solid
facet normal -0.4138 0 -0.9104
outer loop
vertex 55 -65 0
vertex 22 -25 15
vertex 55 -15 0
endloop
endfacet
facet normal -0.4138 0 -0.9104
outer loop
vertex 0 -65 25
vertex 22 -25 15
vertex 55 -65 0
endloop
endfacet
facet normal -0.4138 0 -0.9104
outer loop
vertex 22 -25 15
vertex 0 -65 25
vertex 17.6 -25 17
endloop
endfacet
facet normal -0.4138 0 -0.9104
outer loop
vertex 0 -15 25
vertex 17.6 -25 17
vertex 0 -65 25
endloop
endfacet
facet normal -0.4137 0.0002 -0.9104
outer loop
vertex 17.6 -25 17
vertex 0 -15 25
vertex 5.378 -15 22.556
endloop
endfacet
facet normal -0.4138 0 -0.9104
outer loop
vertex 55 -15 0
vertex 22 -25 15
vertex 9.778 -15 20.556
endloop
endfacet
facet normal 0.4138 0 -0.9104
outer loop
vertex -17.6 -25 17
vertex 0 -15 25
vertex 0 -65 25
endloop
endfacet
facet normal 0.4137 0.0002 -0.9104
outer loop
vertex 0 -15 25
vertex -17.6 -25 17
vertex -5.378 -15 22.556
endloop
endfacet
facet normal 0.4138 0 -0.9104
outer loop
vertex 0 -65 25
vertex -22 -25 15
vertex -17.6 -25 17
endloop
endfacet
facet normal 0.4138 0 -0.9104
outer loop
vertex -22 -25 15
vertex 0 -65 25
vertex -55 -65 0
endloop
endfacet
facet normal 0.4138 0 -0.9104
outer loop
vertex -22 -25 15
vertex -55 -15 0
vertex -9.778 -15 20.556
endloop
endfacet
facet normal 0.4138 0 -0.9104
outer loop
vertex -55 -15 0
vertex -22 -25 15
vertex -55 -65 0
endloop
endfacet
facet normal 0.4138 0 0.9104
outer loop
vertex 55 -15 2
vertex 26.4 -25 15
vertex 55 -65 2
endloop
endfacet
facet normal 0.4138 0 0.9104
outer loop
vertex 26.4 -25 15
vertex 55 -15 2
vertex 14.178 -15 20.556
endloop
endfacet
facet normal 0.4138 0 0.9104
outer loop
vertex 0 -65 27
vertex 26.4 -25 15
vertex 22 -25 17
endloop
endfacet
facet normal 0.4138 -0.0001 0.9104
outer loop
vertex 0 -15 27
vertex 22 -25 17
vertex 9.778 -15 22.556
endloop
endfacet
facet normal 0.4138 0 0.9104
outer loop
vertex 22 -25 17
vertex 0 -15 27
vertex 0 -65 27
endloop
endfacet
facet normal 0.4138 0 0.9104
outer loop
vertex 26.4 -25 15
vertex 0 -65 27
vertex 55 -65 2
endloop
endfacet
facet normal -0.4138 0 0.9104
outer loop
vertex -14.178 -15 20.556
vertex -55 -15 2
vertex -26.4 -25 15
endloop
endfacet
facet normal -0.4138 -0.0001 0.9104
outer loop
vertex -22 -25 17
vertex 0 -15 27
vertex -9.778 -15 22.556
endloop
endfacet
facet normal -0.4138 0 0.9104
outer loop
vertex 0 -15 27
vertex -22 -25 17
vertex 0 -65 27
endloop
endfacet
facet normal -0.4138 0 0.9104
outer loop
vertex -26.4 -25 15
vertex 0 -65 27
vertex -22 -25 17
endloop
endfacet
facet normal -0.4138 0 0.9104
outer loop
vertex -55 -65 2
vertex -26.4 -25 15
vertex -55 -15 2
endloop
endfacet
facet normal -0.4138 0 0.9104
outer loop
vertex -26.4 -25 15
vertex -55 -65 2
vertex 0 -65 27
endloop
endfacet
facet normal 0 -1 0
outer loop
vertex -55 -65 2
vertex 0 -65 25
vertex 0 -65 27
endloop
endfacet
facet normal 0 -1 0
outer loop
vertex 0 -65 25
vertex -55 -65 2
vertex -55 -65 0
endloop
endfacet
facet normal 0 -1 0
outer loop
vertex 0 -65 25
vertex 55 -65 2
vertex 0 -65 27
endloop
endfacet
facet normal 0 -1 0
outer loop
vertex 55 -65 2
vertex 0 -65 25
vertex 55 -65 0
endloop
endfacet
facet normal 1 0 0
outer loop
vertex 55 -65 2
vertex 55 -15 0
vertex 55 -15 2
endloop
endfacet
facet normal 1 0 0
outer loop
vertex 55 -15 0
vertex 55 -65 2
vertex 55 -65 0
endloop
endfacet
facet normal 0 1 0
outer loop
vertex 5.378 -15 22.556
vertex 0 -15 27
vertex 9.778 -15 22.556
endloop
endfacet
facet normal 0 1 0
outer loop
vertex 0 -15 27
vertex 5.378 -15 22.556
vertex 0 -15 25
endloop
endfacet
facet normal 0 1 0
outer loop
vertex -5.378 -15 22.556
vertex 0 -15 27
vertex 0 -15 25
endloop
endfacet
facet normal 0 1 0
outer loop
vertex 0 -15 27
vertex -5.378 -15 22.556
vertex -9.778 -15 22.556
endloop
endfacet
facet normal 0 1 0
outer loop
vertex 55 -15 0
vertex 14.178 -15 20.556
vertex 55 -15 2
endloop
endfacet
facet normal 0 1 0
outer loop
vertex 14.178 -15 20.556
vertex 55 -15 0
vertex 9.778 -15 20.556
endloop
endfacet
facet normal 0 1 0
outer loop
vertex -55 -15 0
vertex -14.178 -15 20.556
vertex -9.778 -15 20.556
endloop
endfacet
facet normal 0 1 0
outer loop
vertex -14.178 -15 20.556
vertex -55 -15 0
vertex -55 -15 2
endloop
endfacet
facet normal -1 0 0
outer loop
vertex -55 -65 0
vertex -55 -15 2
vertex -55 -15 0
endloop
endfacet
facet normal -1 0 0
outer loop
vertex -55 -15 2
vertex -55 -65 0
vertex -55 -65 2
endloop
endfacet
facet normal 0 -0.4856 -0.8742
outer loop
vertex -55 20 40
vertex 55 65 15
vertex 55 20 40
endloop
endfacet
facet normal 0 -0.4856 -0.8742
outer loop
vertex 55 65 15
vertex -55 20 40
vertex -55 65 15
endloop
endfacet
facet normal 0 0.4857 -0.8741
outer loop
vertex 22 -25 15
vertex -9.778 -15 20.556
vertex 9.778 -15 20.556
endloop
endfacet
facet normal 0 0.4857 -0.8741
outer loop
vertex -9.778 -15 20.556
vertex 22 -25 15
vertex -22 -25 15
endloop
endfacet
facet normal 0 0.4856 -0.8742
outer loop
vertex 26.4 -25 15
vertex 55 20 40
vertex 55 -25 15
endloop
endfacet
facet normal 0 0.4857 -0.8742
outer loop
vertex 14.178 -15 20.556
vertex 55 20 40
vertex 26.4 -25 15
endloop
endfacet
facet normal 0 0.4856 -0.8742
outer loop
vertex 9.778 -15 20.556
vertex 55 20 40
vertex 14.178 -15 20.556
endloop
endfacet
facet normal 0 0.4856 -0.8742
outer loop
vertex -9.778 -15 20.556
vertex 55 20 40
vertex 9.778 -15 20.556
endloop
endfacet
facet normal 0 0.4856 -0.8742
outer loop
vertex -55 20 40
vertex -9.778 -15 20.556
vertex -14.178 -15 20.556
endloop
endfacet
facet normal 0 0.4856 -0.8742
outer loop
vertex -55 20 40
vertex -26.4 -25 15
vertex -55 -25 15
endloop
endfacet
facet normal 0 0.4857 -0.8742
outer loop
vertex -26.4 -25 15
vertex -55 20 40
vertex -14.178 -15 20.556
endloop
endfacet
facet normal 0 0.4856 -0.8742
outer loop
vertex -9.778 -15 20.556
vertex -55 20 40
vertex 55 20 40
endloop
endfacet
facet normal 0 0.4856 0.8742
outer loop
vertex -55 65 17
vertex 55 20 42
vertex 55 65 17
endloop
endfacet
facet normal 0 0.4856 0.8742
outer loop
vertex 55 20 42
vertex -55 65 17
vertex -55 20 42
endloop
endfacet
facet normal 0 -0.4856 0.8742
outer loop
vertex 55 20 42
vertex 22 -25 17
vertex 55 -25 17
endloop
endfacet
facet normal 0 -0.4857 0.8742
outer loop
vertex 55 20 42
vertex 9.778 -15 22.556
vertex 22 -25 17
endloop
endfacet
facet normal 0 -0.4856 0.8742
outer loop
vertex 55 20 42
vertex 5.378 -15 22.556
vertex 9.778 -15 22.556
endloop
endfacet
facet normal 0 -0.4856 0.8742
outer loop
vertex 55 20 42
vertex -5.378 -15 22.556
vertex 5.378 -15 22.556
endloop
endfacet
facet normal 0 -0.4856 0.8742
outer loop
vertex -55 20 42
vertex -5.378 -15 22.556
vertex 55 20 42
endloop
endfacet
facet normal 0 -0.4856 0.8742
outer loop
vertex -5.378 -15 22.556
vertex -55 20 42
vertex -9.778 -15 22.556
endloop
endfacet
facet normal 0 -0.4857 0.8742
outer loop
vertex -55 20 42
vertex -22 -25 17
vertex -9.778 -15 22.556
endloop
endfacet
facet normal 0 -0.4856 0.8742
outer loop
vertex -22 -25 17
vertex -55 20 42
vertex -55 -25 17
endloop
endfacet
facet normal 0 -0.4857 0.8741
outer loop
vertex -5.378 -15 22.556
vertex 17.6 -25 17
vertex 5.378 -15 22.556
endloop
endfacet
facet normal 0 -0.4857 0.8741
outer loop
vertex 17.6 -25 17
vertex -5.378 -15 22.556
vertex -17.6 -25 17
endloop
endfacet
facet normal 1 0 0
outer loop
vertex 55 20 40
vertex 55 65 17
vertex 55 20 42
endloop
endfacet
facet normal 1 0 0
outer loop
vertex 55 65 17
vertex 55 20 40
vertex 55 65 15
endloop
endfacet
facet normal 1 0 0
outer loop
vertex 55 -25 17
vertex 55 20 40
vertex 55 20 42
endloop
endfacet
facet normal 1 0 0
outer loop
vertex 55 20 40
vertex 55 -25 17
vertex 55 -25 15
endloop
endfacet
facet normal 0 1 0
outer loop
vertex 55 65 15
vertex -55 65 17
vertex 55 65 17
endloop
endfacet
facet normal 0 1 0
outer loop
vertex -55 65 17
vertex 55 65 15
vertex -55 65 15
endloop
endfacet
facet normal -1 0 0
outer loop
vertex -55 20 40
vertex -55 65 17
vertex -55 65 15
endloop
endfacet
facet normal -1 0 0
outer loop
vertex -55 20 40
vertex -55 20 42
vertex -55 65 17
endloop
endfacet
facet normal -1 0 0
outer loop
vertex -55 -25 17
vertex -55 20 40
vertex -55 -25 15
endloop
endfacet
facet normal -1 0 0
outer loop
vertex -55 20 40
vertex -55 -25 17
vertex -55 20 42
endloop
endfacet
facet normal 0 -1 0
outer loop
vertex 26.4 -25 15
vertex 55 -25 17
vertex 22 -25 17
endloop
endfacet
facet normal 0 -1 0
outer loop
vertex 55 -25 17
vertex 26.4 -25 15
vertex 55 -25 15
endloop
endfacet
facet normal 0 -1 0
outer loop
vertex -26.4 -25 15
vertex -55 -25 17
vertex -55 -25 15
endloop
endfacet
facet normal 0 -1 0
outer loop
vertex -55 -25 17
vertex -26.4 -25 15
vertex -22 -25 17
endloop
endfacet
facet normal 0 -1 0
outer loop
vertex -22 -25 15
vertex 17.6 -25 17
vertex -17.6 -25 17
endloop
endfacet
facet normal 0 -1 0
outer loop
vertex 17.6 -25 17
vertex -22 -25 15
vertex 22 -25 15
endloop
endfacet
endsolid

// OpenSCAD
// file: constants.scad
garageX = 100;
garageY = 40;
mainX = 100;
mainY = 80;

outWallThick = 3.7;
inWallThick = 2.2;
// main file
include <constants.scad>

module roof(thick,start,out,height,sizeX,sizeY) {
	polyhedron
		(points = [
			//low points
			[start[0]-out,start[1]-out,start[2]],
			[start[0]+sizeX+out,start[1]-out,start[2]],
			[start[0]+sizeX+out,start[1]+sizeY+out,start[2]],
			[start[0]-out,start[1]+sizeY+out,start[2]],
			[start[0]+sizeX/2,start[1]-out,start[2]+height],
			[start[0]+sizeX/2,start[1]+sizeY+out,start[2]+height],
			//high points
			[start[0]-out,start[1]-out,start[2]+thick],
			[start[0]+sizeX+out,start[1]-out,start[2]+thick],
			[start[0]+sizeX+out,start[1]+sizeY+out,start[2]+thick],
			[start[0]-out,start[1]+sizeY+out,start[2]+thick],
			[start[0]+sizeX/2,start[1]-out,start[2]+height+thick],
			[start[0]+sizeX/2,start[1]+sizeY+out,start[2]+height+thick],
		],
		faces = [
			//low faces
			[1,5,4],[1,2,5],[0,4,3],[3,4,5],
			//high faces
			[7,10,11],[7,11,8],[6,9,10],[9,11,10],
			//front faces
			[0,6,10],[0,10,4],[1,10,7],[1,4,10],
			[1,7,8],[1,8,2],
			[3,11,9],[3,5,11],[2,8,11],[2,11,5],
			[0,3,6],[6,3,9]
		]
	);
}

module garageRoof(thick,start,out,height) {
	polyhedron
		(points = [
			//low points
			[start[0]-out,start[1]-out,start[2]],
			[start[0]+garageX+out,start[1]-out,start[2]],
			[start[0]+garageX+out,start[1]+garageY+out,start[2]],
			[start[0]-out,start[1]+garageY+out,start[2]],
			[start[0]+garageX/2,start[1]-out,start[2]+height],
			[start[0]+garageX/2,start[1]+garageY+out,start[2]+height],
			//high points
			[start[0]-out,start[1]-out,start[2]+thick],
			[start[0]+garageX+out,start[1]-out,start[2]+thick],
			[start[0]+garageX+out,start[1]+garageY+out,start[2]+thick],
			[start[0]-out,start[1]+garageY+out,start[2]+thick],
			[start[0]+garageX/2,start[1]-out,start[2]+height+thick],
			[start[0]+garageX/2,start[1]+garageY+out,start[2]+height+thick],
		],
		faces = [
			//low faces
			[1,5,4],[1,2,5],[0,4,3],[3,4,5],
			//high faces
			[7,10,11],[7,11,8],[6,9,10],[9,11,10],
			//front faces
			[0,6,10],[0,10,4],[1,10,7],[1,4,10],
			[1,7,8],[1,8,2],
			[3,11,9],[3,5,11],[2,8,11],[2,11,5],
			[0,3,6],[6,3,9]
		]
	);
	
}

module coolRoof(thick,start,out,height,heightV,weightV,sizeX,sizeY) {
	polyhedron
		(points = [
			//low points
			[start[0]-out,start[1]-out,start[2]],
			[start[0]+sizeX+out,start[1]-out,start[2]],
			[start[0]+sizeX+out,start[1]+sizeY+out,start[2]],
			[start[0]-out,start[1]+sizeY+out,start[2]],
			[start[0]+sizeX/2-(heightV*(sizeX/2)/height),start[1]-out,start[2]+height-heightV],
			[start[0]+sizeX/2+(heightV*(sizeX/2)/height),start[1]-out,start[2]+height-heightV],
			[start[0]+sizeX/2,start[1]+weightV,start[2]+height],
			[start[0]+sizeX/2,start[1]+sizeY+out,start[2]+height],
			//high points
			[start[0]-out,start[1]-out,start[2]+thick],
			[start[0]+sizeX+out,start[1]-out,start[2]+thick],
			[start[0]+sizeX+out,start[1]+sizeY+out,start[2]+thick],
			[start[0]-out,start[1]+sizeY+out,start[2]+thick],
			[start[0]+sizeX/2-(heightV*(sizeX/2)/height),start[1]-out,start[2]+height-heightV+thick],
			[start[0]+sizeX/2+(heightV*(sizeX/2)/height),start[1]-out,start[2]+height-heightV+thick],
			
			
			[start[0]+sizeX/2,start[1]+weightV,start[2]+height+thick],
			[start[0]+sizeX/2,start[1]+sizeY+out,start[2]+height+thick],
		],
		faces = [
			//low faces
			[3,0,4],[3,4,6],[3,6,7],[2,7,6],[2,6,5],[2,5,1],[6,4,5],[12,14,13],
			//high faces
			[11,12,8],[11,14,12],[11,15,14],[10,9,13],[10,13,14],[10,14,15],
			//front faces
			[0,8,12],[0,12,4],[4,12,13],[4,13,5],[1,5,13],[1,13,9],
			[1,9,10],[1,10,2],
			[10,15,7],[10,7,2],[15,11,2],[15,2,7],
			[8,0,3],[8,3,11]
		]
	);
}

module highRoof(thick,start,out,height,sizeX,sizeY) {
	/**/translate([start[0]+sizeX/2,start[1]+sizeY/2]) rotate([0,0,90]) roof(thick,[-sizeY/2,-sizeX/2,start[2]],out,height,sizeY,sizeX);
}

module circleRoof(h,radius) {
	linear_extrude(height = h, convexity = 10, scale=0)
		circle(r=radius, $fn = 8);
}

//circleRoof(30,25);
roof(2,[-50,-60,0],5,25,100,40);
translate ([0,30,0]) rotate([0,0,90]) roof(2,[-50,-50,15],5,25,80,100);
